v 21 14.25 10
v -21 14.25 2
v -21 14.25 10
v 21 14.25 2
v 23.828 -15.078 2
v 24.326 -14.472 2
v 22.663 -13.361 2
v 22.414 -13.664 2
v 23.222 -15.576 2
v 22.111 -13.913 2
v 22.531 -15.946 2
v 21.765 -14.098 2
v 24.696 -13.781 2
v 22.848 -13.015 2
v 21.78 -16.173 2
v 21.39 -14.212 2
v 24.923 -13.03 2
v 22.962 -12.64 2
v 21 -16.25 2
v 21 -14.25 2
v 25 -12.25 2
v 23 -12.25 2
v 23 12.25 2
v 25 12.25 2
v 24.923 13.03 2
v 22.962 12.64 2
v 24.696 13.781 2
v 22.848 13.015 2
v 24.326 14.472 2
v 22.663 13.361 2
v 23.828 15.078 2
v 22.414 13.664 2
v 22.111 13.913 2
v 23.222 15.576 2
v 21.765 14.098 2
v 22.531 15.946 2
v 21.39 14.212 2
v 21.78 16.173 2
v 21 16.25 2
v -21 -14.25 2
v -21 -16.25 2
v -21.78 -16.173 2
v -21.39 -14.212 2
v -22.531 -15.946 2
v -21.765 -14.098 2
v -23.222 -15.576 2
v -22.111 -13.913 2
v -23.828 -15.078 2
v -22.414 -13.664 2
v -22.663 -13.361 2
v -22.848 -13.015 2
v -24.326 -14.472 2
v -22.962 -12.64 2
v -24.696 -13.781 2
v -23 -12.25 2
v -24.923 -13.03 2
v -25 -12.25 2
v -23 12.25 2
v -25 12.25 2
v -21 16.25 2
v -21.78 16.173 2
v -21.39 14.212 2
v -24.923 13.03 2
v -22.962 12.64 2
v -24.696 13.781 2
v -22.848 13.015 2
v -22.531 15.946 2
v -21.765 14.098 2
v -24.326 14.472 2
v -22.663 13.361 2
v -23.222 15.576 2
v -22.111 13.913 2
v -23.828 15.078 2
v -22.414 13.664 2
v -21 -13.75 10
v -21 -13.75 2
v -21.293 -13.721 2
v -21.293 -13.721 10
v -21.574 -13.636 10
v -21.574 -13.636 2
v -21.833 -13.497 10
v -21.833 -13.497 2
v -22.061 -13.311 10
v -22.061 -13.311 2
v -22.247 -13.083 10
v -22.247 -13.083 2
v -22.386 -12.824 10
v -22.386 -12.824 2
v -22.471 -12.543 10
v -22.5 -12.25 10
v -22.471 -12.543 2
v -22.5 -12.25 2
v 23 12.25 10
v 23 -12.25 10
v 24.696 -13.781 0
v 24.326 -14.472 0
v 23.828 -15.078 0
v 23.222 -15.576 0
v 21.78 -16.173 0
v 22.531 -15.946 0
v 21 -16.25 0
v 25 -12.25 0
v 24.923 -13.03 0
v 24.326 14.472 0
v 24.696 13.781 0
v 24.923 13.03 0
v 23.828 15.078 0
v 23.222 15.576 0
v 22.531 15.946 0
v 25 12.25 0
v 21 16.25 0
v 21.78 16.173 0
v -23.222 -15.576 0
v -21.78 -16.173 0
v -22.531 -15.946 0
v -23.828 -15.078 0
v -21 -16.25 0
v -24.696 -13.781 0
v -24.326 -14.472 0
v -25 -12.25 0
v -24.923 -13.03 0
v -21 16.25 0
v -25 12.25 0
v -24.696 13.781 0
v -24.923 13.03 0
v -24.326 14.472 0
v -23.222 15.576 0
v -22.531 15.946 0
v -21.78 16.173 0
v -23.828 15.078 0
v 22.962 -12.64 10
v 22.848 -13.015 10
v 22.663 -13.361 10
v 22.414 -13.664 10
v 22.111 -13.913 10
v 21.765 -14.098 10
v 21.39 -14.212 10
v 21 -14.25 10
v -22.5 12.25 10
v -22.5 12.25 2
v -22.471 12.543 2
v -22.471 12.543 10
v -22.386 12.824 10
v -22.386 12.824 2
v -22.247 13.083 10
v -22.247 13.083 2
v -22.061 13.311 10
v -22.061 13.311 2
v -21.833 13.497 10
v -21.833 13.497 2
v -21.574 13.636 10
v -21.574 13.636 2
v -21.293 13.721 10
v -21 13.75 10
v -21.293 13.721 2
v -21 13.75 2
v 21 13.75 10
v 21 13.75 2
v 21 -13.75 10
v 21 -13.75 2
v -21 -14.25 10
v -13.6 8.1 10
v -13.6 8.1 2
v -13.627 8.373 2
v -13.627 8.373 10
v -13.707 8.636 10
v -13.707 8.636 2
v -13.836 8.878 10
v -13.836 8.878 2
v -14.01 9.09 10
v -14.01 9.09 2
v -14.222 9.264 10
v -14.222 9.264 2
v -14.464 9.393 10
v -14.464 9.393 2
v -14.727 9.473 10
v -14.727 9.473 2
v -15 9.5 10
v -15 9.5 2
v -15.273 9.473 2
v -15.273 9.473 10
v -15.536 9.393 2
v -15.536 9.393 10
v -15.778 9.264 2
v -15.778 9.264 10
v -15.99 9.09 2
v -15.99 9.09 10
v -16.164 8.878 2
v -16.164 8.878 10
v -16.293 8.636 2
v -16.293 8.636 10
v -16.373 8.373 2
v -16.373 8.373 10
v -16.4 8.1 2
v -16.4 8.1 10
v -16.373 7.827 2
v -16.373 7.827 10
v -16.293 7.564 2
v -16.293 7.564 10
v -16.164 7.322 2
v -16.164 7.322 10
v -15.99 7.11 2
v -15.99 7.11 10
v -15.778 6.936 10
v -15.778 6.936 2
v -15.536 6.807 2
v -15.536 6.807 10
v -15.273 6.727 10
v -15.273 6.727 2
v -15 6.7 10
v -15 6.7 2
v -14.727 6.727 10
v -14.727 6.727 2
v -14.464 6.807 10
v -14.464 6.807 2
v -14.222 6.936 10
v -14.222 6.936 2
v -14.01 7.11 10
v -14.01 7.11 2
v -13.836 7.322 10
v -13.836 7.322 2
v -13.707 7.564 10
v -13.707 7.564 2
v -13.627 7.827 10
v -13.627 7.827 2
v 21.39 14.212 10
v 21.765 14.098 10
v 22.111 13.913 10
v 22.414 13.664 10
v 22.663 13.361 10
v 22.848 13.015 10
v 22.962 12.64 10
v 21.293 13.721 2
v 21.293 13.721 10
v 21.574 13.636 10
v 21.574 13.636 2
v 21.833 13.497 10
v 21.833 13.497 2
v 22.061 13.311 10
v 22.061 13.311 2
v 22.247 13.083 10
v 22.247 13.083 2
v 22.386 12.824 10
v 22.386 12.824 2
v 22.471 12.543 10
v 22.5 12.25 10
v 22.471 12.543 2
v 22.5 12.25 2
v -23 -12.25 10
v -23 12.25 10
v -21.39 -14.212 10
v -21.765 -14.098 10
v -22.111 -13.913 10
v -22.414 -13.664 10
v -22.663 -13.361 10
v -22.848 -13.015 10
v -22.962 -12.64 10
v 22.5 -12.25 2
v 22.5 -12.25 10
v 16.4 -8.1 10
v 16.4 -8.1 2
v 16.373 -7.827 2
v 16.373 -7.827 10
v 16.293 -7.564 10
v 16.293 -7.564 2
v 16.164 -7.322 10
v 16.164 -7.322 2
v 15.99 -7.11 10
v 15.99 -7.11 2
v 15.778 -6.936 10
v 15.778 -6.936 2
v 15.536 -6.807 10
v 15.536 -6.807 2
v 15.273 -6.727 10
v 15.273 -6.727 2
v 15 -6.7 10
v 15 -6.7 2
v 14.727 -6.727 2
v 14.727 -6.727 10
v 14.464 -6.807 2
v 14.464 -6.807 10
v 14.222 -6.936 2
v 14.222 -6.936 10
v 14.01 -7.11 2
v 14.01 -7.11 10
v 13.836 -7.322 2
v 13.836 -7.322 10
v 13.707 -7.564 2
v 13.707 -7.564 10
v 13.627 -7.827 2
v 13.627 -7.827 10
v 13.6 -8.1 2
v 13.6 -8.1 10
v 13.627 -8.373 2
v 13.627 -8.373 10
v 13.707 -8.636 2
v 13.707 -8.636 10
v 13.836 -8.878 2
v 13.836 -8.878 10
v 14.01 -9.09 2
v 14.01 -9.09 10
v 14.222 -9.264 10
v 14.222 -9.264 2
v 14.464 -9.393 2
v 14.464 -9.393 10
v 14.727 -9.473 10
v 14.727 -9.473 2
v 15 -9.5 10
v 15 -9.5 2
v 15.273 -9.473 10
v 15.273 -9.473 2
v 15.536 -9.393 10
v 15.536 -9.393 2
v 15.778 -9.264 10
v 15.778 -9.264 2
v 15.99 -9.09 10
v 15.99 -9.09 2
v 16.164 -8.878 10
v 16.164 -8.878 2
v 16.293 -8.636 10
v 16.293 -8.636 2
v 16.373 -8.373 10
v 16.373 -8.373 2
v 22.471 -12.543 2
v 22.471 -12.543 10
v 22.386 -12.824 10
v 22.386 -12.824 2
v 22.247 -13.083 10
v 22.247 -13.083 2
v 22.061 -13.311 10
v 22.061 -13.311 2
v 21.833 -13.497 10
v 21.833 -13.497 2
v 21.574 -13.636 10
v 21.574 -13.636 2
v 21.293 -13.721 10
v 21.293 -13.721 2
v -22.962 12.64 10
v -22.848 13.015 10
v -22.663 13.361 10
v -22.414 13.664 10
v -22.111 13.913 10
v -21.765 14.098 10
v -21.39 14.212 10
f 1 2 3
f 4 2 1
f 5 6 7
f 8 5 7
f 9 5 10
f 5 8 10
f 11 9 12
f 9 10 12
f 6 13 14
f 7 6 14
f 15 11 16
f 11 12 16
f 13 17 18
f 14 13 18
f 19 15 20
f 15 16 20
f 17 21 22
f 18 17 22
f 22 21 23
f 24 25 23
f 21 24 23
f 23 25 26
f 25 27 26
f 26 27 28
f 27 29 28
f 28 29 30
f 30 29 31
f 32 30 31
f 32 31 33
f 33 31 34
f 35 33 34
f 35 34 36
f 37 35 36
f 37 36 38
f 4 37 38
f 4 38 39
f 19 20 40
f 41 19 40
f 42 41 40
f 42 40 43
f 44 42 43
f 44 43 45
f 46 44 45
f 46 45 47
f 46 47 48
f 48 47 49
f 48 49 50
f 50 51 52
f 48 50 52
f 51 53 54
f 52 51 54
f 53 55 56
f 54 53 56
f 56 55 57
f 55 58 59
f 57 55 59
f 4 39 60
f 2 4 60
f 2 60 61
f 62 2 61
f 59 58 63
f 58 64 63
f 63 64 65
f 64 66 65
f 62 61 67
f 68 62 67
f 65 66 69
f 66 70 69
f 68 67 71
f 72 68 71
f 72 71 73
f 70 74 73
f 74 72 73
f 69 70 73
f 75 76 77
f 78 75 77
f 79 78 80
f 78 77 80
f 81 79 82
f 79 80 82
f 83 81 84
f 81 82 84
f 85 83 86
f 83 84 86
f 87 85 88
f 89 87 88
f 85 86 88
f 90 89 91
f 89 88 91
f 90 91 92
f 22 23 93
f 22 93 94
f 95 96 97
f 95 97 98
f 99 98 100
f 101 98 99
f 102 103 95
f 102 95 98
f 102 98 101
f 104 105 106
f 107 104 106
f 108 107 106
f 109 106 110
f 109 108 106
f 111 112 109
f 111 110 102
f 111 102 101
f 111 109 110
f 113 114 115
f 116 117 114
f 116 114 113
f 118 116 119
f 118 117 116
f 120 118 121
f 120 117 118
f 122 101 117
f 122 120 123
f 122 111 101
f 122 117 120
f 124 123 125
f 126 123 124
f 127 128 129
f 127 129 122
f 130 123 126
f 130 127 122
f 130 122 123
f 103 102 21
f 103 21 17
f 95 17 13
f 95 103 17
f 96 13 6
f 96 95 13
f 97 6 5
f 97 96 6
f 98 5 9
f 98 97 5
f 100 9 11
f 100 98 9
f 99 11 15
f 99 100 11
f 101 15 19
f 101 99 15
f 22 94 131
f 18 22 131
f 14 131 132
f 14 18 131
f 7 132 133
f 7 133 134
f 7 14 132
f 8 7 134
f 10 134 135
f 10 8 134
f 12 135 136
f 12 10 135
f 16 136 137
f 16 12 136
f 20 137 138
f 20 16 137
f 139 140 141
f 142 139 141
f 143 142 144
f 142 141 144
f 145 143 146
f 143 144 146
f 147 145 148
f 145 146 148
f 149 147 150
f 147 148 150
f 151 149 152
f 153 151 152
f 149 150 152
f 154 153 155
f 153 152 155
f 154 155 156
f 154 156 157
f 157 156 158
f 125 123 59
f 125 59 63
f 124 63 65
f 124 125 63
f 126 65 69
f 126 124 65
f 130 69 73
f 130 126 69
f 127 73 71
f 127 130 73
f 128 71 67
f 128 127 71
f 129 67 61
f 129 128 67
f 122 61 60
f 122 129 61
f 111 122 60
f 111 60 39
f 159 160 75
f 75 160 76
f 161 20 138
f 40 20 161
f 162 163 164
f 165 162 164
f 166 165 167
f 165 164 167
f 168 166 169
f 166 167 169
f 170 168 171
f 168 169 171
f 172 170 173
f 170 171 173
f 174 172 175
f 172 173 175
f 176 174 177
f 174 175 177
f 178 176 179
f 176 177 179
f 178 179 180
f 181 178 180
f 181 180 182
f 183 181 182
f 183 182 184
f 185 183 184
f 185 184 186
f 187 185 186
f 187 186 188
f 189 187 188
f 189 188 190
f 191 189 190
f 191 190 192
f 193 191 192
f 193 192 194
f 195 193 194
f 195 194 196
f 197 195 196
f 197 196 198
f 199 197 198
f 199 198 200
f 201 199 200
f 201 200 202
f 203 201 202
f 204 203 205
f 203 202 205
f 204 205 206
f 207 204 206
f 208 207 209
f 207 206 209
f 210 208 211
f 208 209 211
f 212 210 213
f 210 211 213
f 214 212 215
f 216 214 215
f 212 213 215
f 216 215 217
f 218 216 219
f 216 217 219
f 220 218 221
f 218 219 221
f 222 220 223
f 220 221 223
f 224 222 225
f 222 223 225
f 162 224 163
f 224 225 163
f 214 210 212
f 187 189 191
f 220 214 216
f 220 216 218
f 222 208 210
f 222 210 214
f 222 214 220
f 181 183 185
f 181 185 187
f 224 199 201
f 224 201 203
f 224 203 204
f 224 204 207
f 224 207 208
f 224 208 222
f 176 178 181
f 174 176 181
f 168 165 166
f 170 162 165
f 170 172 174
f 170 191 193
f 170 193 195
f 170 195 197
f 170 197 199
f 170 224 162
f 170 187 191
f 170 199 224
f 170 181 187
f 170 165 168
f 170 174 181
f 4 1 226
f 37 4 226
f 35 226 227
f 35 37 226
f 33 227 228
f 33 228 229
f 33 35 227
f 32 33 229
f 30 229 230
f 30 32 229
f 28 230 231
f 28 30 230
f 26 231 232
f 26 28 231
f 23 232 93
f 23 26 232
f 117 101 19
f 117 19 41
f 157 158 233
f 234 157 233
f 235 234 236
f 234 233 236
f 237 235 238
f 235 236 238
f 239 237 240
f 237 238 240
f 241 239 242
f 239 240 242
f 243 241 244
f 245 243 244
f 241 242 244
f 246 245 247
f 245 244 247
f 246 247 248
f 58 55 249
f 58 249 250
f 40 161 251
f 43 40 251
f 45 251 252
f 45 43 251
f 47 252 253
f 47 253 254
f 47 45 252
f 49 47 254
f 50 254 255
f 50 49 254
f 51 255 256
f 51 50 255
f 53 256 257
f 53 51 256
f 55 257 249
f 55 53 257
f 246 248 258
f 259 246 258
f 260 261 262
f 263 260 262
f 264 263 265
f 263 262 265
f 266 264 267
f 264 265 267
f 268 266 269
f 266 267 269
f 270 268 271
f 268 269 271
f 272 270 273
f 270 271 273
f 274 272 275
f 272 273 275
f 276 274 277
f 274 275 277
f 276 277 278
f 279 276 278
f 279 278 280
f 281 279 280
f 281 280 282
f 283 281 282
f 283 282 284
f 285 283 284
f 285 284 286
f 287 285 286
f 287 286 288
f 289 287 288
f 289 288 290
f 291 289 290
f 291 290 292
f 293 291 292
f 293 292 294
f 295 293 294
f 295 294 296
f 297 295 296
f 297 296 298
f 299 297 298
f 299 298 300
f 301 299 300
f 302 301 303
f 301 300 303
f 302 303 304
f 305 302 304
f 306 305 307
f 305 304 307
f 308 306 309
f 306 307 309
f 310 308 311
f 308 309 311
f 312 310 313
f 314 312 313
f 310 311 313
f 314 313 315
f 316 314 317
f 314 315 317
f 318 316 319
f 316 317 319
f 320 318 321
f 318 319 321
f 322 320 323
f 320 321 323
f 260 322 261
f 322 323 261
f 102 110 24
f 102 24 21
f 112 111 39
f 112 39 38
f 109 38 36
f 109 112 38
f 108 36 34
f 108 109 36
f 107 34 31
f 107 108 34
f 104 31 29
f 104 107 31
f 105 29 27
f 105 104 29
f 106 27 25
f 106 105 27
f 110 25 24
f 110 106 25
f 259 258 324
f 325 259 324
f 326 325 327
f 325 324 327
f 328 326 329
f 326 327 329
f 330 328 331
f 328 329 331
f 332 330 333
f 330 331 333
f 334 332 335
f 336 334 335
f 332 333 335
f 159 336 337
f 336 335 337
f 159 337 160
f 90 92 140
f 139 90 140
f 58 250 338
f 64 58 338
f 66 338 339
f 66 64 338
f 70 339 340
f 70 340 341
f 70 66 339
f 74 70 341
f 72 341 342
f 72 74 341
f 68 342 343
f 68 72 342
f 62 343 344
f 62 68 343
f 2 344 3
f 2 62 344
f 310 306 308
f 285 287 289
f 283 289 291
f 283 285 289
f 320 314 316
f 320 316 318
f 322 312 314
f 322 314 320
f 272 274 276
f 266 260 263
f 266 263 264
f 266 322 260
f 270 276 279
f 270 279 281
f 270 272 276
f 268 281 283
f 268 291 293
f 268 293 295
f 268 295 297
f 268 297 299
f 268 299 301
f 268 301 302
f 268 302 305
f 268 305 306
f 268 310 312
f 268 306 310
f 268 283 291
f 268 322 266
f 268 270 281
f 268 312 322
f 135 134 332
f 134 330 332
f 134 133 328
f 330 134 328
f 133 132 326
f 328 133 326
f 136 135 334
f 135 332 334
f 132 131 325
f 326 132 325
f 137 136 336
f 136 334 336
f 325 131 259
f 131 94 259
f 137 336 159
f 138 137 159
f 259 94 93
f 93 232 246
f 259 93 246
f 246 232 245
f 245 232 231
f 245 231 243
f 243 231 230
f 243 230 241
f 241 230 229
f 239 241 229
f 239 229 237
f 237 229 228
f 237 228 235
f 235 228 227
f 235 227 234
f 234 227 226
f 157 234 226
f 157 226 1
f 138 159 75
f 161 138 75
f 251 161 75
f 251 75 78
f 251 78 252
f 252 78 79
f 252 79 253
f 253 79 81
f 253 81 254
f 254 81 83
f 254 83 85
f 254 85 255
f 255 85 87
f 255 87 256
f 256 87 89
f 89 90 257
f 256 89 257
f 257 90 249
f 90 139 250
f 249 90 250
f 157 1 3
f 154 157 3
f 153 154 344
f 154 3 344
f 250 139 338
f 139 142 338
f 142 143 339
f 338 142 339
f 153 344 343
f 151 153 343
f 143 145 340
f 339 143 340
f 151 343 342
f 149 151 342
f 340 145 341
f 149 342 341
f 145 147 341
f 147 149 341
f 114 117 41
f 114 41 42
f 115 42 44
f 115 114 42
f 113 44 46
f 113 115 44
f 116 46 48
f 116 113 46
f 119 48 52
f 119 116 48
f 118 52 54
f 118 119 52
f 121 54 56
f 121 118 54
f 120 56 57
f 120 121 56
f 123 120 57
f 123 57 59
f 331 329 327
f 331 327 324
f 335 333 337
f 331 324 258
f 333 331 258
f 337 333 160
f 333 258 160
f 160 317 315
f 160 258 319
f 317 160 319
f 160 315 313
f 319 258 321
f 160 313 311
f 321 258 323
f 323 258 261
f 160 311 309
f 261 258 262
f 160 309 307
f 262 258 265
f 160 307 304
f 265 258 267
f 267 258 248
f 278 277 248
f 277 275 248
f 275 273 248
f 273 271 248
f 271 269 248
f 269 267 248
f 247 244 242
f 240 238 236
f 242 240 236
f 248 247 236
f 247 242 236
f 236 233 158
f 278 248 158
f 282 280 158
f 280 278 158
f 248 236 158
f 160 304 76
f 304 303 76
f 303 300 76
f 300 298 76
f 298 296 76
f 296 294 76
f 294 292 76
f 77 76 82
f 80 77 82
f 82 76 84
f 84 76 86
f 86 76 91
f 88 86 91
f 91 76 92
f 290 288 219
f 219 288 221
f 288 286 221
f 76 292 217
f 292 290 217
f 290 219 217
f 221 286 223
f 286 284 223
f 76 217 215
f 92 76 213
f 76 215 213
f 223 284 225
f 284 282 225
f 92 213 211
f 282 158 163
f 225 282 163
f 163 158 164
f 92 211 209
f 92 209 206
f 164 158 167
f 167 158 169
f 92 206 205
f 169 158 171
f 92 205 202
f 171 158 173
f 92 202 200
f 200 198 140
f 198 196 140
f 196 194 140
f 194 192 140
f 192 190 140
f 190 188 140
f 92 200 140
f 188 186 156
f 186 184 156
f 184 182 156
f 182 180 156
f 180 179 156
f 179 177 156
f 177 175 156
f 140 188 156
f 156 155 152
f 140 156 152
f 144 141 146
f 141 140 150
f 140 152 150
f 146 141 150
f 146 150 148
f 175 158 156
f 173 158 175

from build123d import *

# Parameters (mm, degrees)
BOSS_EXTRUDE1_DEPTH = 2
SKETCH1_3_R         = 1.4
BOSS_EXTRUDE2_DEPTH = 10


with BuildPart() as part:
    # Sketch1 → Boss-Extrude1 (new body)
    with BuildSketch(Plane.XY):
        with BuildLine():
            ThreePointArc((-25, -12.25), (-23.828427125, -15.078427125), (-21, -16.25))
            Line((-21, -16.25), (21, -16.25))
            ThreePointArc((21, -16.25), (23.828427125, -15.078427125), (25, -12.25))
            Line((25, -12.25), (25, 12.25))
            ThreePointArc((25, 12.25), (23.828427125, 15.078427125), (21, 16.25))
            Line((21, 16.25), (-21, 16.25))
            ThreePointArc((-21, 16.25), (-23.828427125, 15.078427125), (-25, 12.25))
            Line((-25, 12.25), (-25, -12.25))
        make_face()
    extrude(amount=BOSS_EXTRUDE1_DEPTH)

    # Sketch1<3> → Boss-Extrude2 (add)
    # profile 1 of 3: a face of its own
    with BuildSketch(Plane.XY):
        with BuildLine():
            Line((21, 14.25), (-21, 14.25))
            ThreePointArc((-21, 14.25), (-22.414213562, 13.664213562), (-23, 12.25))
            Line((-23, 12.25), (-23, -12.25))
            ThreePointArc((-23, -12.25), (-22.414213562, -13.664213562), (-21, -14.25))
            Line((-21, -14.25), (21, -14.25))
            ThreePointArc((21, -14.25), (22.414213562, -13.664213562), (23, -12.25))
            Line((23, -12.25), (23, 12.25))
            ThreePointArc((23, 12.25), (22.414213562, 13.664213562), (21, 14.25))
        make_face()
        with BuildLine():
            ThreePointArc((-22.5, 12.25), (-22.060660172, 13.310660172), (-21, 13.75))
            Line((-21, 13.75), (21, 13.75))
            ThreePointArc((21, 13.75), (22.060660172, 13.310660172), (22.5, 12.25))
            Line((22.5, 12.25), (22.5, -12.25))
            ThreePointArc((22.5, -12.25), (22.060660172, -13.310660172), (21, -13.75))
            Line((21, -13.75), (-21, -13.75))
            ThreePointArc((-21, -13.75), (-22.060660172, -13.310660172), (-22.5, -12.25))
            Line((-22.5, -12.25), (-22.5, 12.25))
        make_face(mode=Mode.SUBTRACT)
    # profile 2 of 3: a face of its own
    with BuildSketch(Plane.XY):
        with Locations((-15, 8.1)):
            Circle(SKETCH1_3_R)
    # profile 3 of 3: a face of its own
    with BuildSketch(Plane.XY):
        with Locations((15, -8.1)):
            Circle(SKETCH1_3_R)
    extrude(amount=BOSS_EXTRUDE2_DEPTH)


solid = part.part
